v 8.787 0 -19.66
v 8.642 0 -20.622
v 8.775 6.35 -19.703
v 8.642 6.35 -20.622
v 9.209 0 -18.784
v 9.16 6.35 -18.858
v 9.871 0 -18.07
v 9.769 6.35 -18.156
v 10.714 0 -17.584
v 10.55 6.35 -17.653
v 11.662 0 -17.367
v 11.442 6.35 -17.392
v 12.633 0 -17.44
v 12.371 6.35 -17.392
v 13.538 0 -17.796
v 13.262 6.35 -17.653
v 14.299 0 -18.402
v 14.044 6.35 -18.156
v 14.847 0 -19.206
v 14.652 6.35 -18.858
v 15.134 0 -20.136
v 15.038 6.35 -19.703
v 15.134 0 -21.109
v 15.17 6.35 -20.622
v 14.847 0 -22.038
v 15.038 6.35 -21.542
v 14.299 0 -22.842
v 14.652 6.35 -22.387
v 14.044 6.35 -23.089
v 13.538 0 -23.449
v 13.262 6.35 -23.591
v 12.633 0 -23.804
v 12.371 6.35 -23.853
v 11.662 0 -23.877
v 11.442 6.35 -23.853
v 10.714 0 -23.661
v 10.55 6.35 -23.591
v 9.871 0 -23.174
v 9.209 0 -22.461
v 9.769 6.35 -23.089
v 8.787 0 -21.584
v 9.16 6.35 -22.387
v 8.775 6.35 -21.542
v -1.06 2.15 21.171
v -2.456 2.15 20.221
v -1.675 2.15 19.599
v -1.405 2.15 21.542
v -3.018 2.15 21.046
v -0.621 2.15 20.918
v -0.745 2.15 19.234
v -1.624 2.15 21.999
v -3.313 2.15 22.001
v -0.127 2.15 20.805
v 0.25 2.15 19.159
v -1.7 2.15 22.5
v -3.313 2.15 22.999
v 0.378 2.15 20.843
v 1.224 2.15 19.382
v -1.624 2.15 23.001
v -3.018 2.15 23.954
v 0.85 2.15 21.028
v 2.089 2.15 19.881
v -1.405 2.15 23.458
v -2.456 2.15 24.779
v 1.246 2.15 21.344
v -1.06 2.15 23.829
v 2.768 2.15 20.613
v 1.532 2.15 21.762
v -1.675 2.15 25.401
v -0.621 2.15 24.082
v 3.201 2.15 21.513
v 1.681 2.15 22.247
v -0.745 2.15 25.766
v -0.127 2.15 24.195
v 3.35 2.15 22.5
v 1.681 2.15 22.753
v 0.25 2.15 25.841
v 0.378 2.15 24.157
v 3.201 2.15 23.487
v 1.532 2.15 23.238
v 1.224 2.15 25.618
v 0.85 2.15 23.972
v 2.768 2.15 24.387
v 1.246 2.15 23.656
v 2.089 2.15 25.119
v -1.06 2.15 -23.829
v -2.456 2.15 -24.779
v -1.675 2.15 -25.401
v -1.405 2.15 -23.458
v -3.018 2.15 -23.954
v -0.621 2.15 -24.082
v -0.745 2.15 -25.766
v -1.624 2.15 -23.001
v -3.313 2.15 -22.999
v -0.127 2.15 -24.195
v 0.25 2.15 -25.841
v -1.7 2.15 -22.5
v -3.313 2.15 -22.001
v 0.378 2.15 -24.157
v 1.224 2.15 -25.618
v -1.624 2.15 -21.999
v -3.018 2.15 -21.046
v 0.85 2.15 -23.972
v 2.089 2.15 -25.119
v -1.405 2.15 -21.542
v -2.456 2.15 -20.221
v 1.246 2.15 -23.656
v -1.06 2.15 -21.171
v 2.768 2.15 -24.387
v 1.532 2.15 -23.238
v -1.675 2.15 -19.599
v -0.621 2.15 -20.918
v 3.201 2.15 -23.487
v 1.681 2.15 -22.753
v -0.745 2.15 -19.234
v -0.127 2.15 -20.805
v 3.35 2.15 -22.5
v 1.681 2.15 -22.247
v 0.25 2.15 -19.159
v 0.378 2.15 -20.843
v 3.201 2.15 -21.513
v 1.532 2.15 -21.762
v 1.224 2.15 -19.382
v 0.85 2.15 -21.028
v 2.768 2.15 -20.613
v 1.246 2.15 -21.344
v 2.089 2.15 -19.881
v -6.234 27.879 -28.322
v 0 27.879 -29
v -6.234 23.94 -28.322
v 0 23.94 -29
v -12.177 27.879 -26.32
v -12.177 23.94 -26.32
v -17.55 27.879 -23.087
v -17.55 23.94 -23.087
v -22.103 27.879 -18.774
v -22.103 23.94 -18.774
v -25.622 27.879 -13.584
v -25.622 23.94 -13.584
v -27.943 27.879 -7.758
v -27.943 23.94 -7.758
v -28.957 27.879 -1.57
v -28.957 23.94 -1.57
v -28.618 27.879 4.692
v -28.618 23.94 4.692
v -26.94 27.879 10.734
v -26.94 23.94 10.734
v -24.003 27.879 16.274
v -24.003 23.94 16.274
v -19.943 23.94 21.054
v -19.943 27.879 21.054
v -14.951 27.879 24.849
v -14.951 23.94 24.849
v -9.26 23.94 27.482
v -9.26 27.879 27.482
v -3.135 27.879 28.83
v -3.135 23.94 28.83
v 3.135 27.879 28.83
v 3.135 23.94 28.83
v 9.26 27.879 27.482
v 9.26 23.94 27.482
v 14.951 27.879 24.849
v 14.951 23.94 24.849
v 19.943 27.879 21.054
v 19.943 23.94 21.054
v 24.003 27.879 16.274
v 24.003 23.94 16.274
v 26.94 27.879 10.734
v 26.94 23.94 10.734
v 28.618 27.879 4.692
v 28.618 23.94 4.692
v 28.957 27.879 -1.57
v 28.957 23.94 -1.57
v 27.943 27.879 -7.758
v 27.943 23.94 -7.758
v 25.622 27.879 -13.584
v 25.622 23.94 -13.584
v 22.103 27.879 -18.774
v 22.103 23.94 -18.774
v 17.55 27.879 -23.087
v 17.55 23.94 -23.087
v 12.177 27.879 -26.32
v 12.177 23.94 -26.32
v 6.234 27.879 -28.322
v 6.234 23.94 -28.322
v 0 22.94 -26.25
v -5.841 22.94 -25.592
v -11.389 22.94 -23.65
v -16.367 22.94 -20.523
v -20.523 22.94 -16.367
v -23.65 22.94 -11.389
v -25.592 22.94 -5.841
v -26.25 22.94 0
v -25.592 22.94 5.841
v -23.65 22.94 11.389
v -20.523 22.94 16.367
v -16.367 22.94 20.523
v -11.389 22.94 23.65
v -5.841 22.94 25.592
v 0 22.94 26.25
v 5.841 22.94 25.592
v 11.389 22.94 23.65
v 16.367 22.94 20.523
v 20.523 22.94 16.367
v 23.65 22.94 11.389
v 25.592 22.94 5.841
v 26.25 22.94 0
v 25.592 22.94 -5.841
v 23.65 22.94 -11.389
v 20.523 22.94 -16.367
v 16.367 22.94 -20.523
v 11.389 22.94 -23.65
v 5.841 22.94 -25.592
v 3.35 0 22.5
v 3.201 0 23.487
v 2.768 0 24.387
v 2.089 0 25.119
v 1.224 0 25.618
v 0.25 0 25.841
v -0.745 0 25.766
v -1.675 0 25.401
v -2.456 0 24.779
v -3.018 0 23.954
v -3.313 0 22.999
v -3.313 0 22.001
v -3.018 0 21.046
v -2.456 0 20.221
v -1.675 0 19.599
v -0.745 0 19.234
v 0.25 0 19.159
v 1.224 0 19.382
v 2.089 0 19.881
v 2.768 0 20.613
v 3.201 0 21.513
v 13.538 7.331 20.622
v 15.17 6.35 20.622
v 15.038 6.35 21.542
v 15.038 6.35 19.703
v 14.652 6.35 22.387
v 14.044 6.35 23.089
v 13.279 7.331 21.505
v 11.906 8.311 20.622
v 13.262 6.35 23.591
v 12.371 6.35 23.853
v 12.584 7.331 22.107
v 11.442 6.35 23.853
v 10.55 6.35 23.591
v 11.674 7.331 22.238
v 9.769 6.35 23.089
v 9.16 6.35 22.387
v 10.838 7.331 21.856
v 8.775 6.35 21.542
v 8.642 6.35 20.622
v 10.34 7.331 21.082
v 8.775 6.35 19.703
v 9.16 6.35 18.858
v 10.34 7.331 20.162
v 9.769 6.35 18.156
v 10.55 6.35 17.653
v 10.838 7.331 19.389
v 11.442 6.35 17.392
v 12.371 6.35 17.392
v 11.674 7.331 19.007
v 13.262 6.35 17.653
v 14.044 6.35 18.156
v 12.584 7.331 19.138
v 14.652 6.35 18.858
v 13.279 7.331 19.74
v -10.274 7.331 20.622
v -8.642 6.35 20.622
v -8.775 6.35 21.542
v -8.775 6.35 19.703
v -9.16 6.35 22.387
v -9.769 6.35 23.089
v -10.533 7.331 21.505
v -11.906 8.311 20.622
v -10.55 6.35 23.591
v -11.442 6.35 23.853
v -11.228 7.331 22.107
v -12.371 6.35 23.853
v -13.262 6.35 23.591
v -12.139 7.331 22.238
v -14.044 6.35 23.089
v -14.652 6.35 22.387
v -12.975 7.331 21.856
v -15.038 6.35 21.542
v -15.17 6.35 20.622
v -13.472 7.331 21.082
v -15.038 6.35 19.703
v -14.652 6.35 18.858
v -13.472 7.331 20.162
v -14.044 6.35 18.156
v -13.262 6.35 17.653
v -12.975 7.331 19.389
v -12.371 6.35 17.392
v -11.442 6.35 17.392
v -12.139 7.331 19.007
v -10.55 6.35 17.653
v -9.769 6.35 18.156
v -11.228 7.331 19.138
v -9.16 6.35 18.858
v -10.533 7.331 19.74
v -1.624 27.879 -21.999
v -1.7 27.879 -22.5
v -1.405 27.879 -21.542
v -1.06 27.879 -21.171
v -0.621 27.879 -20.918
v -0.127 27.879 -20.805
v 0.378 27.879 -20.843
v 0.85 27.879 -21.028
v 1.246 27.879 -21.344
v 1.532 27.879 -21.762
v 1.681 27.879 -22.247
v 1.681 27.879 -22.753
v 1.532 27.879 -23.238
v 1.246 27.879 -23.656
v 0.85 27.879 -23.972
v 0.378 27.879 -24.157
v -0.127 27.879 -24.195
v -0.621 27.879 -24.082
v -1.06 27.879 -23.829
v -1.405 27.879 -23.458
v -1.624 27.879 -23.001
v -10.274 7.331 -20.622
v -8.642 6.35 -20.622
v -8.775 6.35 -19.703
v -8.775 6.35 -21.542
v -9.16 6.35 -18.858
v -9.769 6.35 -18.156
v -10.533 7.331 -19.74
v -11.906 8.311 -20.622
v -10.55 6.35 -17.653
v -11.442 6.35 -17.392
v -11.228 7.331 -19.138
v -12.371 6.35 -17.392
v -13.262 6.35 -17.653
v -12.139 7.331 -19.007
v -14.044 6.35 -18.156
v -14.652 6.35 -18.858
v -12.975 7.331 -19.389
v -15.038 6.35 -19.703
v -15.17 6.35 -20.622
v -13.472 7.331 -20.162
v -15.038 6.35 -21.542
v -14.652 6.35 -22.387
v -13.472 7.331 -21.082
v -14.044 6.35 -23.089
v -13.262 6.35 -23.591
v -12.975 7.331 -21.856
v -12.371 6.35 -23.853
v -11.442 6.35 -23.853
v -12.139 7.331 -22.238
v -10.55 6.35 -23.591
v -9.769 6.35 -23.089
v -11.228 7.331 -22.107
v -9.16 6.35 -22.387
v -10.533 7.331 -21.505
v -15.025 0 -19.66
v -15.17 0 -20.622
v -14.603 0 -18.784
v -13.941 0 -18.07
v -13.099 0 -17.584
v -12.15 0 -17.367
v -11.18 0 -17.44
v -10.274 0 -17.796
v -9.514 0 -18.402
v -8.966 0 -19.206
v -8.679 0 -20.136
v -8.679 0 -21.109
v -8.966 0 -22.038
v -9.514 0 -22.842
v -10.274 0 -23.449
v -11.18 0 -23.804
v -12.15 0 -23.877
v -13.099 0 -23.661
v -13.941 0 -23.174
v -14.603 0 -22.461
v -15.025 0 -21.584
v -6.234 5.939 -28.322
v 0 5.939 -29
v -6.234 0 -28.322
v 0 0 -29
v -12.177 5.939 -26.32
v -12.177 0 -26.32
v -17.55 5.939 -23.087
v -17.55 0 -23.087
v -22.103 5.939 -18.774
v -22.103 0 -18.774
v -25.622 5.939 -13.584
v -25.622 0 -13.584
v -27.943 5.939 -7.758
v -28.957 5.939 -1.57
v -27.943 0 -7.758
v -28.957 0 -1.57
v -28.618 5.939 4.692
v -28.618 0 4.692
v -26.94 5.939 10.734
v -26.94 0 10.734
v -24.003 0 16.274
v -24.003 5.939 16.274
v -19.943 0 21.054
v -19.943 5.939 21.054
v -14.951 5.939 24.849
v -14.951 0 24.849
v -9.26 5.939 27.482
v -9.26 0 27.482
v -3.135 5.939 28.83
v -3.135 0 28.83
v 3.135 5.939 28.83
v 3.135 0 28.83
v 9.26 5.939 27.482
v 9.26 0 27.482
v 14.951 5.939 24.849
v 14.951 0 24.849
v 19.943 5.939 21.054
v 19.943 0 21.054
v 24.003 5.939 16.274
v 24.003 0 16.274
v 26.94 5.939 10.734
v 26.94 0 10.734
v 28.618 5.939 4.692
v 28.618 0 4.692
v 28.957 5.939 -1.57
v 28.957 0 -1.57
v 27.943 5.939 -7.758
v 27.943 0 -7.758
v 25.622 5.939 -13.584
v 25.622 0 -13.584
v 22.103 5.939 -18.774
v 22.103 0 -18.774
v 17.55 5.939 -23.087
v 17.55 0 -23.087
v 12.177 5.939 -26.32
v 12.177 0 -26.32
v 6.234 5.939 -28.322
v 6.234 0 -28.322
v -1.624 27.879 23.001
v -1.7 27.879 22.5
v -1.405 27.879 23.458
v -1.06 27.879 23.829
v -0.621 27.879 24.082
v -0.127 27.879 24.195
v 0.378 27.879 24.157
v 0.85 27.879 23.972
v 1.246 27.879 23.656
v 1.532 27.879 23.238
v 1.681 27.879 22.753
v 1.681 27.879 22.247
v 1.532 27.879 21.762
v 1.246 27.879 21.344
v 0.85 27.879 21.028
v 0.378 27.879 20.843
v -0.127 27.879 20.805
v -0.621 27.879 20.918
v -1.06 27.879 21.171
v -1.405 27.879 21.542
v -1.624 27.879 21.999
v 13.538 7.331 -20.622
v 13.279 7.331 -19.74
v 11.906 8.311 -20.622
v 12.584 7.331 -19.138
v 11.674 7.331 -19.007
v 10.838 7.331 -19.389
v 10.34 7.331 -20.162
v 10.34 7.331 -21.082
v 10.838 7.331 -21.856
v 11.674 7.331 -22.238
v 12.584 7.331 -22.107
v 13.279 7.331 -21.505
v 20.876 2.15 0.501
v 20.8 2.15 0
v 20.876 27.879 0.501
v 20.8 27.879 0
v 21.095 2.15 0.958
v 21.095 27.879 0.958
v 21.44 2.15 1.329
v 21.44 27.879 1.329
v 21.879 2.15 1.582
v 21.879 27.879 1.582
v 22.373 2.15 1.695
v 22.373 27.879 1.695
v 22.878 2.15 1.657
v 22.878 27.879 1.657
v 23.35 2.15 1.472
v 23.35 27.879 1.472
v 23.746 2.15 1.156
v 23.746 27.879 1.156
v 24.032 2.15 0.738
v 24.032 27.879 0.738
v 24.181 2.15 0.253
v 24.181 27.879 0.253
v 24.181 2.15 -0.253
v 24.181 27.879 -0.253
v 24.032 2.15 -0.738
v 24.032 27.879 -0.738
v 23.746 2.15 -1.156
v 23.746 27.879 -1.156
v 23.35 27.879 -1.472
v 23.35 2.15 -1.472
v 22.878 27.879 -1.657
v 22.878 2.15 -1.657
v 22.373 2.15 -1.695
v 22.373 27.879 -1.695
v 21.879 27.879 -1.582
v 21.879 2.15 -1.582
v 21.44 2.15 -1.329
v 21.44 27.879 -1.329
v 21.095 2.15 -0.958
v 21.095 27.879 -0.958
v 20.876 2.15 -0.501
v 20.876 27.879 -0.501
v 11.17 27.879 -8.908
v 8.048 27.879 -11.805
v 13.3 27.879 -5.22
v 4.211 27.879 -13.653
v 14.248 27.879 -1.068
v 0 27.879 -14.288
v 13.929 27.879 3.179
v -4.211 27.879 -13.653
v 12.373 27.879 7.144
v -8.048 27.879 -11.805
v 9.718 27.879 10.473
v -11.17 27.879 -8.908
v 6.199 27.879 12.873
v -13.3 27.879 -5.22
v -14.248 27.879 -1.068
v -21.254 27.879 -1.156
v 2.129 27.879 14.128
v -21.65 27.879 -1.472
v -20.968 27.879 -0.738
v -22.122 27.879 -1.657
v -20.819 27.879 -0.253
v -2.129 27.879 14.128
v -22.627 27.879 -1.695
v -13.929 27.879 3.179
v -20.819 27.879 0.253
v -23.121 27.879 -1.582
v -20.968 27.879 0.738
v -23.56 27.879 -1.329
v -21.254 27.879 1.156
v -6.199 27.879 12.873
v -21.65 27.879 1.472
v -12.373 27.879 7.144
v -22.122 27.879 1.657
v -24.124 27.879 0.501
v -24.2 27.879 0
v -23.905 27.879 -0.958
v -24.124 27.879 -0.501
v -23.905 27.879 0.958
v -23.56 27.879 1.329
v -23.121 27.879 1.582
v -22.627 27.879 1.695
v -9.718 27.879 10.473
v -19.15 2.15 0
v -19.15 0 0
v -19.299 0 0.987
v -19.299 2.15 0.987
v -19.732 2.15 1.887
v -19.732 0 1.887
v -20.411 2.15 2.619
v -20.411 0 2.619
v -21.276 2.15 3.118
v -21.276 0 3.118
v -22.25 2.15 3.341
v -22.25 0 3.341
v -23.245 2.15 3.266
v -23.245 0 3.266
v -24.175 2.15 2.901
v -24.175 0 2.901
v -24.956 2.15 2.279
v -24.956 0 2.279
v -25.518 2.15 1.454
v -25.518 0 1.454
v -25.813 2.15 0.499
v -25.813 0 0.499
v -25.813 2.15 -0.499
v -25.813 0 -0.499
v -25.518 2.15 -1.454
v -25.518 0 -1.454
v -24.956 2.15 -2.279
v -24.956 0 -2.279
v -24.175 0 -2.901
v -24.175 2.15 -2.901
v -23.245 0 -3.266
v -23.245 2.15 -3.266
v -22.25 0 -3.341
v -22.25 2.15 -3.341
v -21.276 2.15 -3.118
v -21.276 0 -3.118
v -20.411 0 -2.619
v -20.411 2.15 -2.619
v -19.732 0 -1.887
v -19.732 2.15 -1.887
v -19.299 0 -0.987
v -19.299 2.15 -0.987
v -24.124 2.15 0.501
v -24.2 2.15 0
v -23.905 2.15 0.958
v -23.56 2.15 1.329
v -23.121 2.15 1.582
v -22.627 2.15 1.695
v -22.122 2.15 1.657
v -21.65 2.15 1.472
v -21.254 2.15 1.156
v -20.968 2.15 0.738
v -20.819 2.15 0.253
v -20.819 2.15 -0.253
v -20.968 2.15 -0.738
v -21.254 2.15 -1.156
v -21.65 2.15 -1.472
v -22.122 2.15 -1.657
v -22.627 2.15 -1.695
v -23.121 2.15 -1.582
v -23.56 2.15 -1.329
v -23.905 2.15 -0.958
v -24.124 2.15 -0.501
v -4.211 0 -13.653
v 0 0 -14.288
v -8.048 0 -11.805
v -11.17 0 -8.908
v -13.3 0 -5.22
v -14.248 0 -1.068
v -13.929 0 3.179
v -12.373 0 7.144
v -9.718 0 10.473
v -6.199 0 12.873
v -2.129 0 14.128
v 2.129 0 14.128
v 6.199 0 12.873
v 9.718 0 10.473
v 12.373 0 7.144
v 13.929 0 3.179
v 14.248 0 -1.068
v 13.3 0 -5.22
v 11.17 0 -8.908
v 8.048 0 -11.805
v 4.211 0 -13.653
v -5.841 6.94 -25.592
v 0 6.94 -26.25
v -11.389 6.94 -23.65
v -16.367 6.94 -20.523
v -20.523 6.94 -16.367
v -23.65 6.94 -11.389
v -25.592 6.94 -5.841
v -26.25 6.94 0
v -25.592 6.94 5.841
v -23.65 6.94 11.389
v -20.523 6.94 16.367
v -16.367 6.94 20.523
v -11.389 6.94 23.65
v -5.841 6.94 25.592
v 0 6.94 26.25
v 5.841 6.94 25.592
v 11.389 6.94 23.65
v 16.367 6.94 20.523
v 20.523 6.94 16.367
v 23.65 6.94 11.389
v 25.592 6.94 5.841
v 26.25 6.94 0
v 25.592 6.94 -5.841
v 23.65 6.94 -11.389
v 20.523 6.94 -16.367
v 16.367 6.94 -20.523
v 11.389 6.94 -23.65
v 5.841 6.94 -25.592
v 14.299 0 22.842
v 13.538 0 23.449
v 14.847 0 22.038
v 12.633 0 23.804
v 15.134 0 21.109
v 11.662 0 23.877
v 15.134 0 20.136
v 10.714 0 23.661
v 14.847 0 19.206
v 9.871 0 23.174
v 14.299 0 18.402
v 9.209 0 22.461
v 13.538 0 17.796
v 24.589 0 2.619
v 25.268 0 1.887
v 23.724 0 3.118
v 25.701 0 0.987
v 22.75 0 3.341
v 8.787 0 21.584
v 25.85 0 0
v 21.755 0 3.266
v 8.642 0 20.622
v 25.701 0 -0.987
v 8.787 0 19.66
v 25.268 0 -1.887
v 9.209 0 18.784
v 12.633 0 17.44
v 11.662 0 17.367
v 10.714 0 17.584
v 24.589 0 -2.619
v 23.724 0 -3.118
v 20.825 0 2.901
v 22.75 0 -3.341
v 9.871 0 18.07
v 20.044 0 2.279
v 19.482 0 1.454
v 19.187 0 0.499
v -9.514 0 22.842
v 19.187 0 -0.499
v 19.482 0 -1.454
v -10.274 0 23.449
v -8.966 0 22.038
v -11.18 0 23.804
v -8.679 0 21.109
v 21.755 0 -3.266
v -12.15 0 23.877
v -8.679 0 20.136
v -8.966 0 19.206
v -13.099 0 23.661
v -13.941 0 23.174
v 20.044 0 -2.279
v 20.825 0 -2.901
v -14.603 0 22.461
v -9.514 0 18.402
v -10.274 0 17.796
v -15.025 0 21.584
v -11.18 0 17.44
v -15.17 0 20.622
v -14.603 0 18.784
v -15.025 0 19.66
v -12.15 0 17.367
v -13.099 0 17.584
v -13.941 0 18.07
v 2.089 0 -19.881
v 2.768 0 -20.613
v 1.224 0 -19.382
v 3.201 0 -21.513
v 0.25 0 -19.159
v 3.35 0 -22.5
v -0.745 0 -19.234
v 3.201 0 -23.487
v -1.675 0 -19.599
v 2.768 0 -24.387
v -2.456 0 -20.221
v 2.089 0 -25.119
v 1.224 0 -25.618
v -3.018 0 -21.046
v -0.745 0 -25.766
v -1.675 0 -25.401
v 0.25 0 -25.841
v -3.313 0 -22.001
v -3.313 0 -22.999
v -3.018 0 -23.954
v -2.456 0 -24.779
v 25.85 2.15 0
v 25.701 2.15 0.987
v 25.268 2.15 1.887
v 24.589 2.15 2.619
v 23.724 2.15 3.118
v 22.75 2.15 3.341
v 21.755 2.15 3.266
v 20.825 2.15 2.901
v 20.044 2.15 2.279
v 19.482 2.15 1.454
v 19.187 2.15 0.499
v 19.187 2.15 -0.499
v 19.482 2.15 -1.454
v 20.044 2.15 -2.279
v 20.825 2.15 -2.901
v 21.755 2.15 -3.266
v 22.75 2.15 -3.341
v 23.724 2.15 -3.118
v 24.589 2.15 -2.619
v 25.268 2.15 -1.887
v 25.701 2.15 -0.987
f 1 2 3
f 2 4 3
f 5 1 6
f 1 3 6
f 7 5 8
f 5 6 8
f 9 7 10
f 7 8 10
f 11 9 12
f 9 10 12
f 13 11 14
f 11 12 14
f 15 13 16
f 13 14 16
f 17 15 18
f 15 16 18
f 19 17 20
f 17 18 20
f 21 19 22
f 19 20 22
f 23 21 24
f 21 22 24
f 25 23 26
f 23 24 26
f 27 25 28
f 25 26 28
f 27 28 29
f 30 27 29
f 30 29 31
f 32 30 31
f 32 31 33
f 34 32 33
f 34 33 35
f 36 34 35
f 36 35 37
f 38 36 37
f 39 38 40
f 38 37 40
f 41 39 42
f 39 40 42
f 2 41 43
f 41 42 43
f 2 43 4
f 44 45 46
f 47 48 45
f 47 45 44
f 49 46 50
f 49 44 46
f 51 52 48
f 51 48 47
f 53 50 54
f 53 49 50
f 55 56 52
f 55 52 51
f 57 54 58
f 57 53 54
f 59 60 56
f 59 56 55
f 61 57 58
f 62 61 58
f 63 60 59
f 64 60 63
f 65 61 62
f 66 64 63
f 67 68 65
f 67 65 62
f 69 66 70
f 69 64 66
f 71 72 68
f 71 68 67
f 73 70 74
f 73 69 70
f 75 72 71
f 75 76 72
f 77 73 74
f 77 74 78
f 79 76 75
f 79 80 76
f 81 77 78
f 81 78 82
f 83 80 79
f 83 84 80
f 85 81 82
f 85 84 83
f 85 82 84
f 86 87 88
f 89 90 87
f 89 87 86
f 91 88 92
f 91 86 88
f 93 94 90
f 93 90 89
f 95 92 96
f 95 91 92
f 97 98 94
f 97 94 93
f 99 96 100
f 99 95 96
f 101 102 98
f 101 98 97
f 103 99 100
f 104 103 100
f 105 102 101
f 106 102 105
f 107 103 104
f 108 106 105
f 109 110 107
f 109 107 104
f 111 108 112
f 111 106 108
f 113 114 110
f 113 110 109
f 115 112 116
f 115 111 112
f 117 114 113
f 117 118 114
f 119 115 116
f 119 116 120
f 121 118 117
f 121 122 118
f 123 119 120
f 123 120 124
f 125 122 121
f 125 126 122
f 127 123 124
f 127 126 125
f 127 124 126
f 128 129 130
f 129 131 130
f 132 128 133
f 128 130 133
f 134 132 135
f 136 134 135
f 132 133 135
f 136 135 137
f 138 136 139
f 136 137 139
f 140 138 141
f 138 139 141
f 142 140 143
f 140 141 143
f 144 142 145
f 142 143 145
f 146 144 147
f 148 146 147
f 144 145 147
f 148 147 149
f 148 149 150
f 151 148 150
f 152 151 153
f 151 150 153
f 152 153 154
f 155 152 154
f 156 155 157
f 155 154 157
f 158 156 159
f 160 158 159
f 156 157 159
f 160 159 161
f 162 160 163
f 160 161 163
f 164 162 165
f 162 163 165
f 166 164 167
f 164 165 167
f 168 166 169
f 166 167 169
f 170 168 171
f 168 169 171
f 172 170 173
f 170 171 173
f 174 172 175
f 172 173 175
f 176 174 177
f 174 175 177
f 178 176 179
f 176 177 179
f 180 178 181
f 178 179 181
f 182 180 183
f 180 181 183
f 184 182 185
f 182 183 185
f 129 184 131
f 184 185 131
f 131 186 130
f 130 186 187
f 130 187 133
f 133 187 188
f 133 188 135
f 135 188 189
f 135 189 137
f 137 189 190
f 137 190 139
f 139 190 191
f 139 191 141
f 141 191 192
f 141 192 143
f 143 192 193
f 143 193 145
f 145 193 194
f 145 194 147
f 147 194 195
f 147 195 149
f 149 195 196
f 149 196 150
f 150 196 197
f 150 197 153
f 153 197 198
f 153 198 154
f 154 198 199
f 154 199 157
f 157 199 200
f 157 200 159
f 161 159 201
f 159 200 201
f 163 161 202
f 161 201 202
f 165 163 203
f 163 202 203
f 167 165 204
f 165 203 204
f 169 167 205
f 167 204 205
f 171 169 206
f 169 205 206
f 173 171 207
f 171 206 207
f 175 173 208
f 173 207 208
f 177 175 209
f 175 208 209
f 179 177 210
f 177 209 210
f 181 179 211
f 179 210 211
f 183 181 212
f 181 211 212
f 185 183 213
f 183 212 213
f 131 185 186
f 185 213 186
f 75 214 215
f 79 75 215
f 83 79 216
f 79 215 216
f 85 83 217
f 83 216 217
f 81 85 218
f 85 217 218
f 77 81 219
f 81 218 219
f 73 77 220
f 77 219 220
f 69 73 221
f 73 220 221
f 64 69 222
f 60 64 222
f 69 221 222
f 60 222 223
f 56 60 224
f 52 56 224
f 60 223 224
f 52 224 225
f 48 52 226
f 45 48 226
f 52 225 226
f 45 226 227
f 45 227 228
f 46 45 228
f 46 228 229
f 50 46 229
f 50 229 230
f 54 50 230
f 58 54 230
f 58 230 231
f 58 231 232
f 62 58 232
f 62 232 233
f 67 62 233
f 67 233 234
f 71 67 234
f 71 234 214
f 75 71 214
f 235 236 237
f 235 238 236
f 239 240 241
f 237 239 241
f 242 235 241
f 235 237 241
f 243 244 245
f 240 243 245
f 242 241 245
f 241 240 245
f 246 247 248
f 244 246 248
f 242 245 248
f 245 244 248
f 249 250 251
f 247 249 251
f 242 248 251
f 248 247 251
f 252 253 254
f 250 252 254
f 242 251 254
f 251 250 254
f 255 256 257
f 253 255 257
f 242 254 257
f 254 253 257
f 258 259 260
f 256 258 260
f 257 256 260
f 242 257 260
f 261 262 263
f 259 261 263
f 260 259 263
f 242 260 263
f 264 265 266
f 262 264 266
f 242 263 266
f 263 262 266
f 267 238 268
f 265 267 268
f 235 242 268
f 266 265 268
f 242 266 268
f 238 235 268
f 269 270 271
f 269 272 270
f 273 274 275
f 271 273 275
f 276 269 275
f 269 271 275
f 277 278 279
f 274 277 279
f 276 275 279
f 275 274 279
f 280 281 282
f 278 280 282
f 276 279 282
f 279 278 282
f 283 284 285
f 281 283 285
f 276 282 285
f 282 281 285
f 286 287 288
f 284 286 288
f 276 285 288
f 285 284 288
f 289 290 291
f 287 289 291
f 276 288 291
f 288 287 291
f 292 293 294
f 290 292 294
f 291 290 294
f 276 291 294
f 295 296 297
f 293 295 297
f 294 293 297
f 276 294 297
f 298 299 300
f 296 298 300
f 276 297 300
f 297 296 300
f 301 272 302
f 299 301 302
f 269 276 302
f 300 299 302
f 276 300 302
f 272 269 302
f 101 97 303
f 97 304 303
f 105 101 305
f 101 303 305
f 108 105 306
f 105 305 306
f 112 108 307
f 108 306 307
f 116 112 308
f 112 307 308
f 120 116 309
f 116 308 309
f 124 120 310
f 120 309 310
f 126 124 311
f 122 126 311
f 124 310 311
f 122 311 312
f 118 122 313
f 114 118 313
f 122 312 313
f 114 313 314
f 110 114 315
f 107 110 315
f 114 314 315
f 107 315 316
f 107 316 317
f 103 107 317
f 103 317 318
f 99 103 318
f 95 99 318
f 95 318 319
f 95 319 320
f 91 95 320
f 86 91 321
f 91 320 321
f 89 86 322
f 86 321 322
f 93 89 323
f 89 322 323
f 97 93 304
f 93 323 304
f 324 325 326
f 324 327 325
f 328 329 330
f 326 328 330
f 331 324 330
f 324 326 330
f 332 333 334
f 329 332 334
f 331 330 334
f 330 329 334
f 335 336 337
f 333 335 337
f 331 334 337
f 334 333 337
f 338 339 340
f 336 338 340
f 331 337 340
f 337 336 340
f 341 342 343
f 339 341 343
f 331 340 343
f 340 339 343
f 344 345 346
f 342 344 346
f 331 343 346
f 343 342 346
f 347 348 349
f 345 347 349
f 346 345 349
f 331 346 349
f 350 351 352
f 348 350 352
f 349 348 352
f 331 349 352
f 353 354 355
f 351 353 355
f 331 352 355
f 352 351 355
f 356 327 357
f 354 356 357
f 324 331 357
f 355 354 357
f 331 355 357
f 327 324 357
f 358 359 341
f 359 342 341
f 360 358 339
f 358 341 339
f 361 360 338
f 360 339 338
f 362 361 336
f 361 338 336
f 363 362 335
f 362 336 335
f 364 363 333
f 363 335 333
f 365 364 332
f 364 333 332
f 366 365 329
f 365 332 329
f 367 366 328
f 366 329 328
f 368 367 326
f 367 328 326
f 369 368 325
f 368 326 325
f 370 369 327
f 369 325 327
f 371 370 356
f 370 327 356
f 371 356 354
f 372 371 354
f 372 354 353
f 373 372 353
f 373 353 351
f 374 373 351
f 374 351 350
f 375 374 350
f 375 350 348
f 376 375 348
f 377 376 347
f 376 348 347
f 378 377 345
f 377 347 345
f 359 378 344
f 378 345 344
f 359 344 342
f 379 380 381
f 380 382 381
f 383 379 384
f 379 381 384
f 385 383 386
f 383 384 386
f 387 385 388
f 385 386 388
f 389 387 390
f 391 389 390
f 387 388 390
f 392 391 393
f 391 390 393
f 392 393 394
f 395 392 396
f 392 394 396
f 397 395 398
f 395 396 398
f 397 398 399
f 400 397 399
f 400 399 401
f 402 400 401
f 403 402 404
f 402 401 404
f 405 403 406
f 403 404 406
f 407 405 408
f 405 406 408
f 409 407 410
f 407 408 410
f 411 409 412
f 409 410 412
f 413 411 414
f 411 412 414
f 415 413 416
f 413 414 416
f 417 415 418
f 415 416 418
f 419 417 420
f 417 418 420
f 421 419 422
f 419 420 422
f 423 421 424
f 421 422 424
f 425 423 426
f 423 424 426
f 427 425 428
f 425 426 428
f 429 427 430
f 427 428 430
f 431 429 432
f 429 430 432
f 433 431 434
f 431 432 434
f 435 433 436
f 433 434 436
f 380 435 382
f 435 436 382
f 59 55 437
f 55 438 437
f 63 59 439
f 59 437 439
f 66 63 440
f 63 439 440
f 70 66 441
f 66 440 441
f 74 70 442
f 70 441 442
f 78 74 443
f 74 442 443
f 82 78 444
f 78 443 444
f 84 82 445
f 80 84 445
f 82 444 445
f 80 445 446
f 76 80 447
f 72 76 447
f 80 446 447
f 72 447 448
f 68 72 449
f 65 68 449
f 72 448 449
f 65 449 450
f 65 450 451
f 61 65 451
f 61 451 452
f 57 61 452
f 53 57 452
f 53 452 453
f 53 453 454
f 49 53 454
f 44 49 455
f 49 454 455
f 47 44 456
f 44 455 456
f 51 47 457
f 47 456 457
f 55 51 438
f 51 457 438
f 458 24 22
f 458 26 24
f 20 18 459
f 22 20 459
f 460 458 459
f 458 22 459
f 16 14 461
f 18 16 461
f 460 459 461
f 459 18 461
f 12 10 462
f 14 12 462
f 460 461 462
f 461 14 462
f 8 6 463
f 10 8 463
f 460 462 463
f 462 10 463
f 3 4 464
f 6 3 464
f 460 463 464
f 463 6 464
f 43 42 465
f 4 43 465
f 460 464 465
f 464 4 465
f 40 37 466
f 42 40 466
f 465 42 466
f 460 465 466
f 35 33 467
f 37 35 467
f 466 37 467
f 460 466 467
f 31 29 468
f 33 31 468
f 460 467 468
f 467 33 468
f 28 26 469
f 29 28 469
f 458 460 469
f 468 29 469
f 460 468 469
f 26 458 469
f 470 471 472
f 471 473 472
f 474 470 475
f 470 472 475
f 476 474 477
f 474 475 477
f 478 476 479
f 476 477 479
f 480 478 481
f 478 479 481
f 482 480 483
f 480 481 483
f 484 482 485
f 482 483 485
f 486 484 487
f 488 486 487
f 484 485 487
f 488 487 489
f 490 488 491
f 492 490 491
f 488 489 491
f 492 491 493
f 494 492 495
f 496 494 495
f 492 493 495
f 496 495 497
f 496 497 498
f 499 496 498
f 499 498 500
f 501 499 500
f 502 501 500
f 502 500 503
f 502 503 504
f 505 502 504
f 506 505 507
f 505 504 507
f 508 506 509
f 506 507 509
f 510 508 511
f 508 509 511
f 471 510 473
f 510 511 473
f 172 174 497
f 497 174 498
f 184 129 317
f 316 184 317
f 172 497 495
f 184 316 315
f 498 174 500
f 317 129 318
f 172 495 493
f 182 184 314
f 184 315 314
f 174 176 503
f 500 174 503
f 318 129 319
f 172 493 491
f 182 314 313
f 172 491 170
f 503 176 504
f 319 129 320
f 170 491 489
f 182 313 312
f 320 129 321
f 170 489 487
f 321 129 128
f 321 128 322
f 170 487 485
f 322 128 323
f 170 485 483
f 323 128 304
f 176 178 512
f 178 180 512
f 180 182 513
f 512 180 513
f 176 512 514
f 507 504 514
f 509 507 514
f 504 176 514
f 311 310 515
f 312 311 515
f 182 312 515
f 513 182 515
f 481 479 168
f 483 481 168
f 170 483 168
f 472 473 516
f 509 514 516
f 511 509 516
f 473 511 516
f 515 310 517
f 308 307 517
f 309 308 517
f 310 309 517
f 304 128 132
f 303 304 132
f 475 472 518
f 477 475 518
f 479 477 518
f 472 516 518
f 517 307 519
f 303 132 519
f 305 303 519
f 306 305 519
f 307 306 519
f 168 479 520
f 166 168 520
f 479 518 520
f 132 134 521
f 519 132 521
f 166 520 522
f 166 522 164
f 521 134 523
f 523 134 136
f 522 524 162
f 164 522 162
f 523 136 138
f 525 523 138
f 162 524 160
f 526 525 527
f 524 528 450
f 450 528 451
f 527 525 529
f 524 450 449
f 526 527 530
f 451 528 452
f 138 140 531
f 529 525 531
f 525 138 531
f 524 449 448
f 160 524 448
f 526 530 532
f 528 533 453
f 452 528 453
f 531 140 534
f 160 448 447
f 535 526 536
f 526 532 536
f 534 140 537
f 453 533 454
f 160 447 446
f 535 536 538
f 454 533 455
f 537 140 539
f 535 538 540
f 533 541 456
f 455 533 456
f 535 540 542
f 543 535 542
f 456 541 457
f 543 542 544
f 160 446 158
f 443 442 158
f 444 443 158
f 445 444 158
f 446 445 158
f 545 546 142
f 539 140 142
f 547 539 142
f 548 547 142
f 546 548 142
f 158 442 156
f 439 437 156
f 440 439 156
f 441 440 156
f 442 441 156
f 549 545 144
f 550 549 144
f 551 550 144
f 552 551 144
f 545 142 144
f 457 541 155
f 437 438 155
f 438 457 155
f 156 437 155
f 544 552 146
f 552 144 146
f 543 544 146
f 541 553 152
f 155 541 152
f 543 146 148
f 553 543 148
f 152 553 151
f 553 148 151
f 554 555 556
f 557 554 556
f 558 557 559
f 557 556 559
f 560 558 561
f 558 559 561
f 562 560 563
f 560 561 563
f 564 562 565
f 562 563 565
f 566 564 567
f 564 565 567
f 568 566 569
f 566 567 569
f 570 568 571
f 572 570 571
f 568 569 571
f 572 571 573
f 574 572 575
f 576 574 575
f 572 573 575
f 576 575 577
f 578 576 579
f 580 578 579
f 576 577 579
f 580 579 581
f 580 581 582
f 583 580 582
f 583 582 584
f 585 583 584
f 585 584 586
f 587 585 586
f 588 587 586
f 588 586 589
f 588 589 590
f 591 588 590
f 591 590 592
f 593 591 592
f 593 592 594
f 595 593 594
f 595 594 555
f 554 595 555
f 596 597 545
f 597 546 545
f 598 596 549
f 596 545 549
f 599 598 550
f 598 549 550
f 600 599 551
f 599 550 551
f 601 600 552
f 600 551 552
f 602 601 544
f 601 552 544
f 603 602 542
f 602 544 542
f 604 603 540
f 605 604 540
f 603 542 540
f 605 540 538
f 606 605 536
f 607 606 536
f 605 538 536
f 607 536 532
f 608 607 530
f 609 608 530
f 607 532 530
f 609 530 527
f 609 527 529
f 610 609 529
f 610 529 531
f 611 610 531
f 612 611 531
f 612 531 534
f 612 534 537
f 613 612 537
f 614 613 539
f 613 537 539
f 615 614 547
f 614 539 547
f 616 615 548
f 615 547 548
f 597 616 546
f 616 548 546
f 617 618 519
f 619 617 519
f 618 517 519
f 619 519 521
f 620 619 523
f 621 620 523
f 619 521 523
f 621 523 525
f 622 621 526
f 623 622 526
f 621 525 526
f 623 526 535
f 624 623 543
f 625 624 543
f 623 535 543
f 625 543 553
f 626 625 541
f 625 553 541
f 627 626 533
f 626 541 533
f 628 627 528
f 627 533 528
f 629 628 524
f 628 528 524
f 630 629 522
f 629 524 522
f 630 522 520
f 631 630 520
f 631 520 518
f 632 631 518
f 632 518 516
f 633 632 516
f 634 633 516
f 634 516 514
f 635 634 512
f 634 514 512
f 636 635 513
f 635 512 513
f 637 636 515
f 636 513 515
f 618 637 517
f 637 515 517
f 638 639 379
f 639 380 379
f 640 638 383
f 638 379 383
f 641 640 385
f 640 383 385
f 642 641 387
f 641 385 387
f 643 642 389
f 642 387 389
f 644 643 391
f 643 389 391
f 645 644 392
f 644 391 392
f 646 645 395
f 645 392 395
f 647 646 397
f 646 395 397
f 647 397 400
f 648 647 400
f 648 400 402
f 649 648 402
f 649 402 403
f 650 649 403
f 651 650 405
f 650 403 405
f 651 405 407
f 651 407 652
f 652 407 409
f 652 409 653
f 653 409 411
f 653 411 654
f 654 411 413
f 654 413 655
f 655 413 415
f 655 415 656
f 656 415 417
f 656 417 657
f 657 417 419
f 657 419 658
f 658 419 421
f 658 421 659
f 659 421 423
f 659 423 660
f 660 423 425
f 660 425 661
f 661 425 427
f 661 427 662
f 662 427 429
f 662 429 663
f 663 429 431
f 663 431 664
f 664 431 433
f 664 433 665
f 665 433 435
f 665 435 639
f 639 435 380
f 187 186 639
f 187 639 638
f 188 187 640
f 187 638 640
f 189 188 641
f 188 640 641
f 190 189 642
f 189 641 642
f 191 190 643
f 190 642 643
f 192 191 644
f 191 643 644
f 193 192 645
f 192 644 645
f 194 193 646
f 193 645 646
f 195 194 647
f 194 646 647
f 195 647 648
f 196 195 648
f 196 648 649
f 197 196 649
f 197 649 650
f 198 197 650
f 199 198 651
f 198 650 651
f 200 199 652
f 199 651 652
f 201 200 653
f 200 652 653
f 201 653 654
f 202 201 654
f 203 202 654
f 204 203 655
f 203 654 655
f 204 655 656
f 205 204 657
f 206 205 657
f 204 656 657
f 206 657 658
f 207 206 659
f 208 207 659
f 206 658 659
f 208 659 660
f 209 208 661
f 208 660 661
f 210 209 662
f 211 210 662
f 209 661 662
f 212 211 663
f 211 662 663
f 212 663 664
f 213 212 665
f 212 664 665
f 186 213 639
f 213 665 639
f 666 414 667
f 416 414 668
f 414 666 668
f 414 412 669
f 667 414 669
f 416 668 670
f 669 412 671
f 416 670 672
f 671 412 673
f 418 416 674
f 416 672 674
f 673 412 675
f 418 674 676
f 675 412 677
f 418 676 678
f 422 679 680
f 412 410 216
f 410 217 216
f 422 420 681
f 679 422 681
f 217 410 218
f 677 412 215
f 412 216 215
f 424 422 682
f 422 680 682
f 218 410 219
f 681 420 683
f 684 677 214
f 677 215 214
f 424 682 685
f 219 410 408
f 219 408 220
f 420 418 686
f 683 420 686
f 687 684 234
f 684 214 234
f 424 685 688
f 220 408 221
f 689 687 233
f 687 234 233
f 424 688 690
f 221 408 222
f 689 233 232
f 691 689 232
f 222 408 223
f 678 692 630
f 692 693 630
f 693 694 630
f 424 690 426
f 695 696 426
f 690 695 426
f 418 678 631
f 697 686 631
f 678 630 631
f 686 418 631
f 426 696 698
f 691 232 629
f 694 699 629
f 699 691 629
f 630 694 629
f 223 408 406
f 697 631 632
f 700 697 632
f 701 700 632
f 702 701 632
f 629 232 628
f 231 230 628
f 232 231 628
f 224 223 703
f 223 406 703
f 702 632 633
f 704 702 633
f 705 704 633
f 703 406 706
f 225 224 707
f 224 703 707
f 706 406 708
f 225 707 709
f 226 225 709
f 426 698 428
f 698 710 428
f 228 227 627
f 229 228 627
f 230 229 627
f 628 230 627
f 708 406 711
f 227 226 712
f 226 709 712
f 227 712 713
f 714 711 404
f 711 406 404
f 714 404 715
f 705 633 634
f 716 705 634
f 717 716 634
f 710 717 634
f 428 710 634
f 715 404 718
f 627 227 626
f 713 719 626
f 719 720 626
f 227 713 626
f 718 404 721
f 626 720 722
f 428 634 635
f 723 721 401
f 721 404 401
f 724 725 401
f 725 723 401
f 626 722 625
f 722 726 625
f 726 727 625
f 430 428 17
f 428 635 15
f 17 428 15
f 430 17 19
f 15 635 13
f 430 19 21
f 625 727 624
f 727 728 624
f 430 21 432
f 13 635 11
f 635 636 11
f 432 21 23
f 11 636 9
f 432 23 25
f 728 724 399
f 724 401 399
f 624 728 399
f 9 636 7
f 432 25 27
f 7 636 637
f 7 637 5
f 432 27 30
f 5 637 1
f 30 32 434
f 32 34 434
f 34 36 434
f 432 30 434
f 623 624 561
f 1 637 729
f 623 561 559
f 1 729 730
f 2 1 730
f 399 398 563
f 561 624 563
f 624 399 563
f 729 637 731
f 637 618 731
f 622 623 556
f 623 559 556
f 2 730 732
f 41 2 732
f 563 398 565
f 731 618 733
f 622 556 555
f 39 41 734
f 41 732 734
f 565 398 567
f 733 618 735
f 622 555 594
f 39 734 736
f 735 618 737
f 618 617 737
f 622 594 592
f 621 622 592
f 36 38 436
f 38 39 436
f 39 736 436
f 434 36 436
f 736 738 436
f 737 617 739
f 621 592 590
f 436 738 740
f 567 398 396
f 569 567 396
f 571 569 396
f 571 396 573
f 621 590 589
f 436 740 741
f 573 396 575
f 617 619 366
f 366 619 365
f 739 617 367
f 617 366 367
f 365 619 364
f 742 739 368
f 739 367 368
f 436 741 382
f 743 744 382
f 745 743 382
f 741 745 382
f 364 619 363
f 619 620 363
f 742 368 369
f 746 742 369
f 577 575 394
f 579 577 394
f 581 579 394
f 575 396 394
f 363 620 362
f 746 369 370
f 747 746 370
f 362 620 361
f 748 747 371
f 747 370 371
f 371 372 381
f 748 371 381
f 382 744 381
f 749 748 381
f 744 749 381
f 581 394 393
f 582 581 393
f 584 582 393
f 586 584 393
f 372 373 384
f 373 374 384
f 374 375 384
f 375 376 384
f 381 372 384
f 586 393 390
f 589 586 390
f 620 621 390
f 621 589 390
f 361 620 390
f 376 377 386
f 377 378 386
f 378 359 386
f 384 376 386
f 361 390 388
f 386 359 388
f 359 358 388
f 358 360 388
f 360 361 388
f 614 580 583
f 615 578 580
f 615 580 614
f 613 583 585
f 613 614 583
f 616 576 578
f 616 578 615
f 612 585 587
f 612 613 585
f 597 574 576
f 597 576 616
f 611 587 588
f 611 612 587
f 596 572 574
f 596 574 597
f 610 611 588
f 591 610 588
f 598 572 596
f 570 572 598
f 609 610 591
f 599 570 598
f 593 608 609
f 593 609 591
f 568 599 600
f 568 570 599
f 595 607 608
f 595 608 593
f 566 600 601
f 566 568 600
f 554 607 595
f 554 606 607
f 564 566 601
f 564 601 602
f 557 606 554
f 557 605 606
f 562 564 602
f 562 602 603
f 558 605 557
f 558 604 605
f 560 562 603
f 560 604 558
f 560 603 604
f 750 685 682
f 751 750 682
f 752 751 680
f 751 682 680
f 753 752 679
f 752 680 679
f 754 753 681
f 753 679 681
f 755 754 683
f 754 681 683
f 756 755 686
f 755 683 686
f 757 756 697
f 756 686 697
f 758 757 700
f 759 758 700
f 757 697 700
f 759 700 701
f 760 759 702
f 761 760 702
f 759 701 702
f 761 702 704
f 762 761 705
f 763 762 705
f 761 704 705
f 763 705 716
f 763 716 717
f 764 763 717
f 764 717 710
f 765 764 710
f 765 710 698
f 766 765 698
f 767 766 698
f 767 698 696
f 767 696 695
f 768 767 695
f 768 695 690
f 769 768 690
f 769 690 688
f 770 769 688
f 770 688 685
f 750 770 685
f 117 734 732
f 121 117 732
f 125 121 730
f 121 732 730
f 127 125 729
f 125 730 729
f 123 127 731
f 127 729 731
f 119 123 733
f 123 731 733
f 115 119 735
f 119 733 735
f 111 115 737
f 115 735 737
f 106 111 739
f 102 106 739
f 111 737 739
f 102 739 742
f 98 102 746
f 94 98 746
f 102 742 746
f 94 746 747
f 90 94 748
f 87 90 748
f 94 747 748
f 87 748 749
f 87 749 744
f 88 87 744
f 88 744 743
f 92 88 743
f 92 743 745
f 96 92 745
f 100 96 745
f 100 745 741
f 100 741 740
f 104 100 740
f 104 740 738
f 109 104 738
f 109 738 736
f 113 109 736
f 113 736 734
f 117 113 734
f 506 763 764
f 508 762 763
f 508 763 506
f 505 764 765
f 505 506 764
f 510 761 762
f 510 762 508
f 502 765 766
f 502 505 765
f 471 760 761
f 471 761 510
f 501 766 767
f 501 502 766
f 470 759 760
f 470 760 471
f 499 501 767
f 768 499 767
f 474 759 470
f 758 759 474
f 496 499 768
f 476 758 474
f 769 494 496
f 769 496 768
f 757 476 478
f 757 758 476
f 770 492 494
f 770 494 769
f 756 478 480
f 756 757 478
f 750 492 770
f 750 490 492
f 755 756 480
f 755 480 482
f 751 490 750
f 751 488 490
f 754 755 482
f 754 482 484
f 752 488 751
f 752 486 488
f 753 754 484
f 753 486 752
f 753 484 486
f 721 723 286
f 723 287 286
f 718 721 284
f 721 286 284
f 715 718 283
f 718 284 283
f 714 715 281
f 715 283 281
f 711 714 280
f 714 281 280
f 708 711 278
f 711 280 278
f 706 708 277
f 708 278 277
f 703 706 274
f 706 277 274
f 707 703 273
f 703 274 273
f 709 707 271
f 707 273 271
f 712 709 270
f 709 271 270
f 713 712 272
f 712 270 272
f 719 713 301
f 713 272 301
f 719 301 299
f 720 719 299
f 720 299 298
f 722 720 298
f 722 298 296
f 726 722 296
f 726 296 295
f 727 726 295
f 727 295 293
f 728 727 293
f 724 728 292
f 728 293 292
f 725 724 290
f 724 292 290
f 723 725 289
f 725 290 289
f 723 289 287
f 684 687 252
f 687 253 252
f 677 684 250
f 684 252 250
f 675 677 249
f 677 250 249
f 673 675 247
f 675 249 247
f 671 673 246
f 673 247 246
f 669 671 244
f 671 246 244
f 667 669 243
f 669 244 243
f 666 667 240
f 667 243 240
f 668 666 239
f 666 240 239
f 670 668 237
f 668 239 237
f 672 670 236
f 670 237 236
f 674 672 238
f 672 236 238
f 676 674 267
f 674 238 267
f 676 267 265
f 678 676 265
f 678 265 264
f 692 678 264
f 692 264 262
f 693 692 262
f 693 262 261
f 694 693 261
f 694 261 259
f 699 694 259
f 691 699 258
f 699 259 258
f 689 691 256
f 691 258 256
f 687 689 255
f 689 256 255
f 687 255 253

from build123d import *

# Parameters (mm, degrees)
CBORE_FOR_M3_SBHCS1_D           = 3.4
CBORE_FOR_M3_SBHCS1_CBORE_D     = 6.7
CBORE_FOR_M3_SBHCS1_CBORE_DEPTH = 2.15
F_0_257_DIAMETER_HOLE1_D        = 6.5278
F_0_257_DIAMETER_HOLE1_DEPTH    = 6.35
F_0_257_DIAMETER_HOLE1_TIP      = 1.961148974


with BuildPart() as part:
    # Sketch1 → Revolve1 (revolve)
    with BuildSketch(Plane.XY, mode=Mode.PRIVATE) as revolve1_sk:
        Polygon((14.2875, 27.8791), (29, 27.8791), (29, 23.940468144), (26.25, 22.93955), (26.25, 6.93955), (29, 5.938631856), (29, 0), (14.2875, 0), align=None)
    revolve(revolve1_sk.sketch.rotate(Axis((0, 0, 0), (0, 1, 0)), 90), axis=Axis((0, 0, 0), (0, 1, 0)))

    # CBORE for M3 SBHCS1 (through all)
    with Locations(Plane.XZ):
        with Locations((0, 22.5), (0, -22.5), (22.5, 0), (-22.5, 0)):
            CounterBoreHole(CBORE_FOR_M3_SBHCS1_D / 2, CBORE_FOR_M3_SBHCS1_CBORE_D / 2, CBORE_FOR_M3_SBHCS1_CBORE_DEPTH)

    # F (0.257) Diameter Hole1
    with Locations(Plane.XZ):
        with Locations((-11.90625, 20.622229928), (-11.90625, -20.622229928), (11.90625, -20.622229928), (11.90625, 20.622229928)):
            Hole(F_0_257_DIAMETER_HOLE1_D / 2, depth=F_0_257_DIAMETER_HOLE1_DEPTH)
            with Locations((0, 0, -(F_0_257_DIAMETER_HOLE1_DEPTH + F_0_257_DIAMETER_HOLE1_TIP / 2))):  # 118° drill point
                Cone(0, F_0_257_DIAMETER_HOLE1_D / 2, F_0_257_DIAMETER_HOLE1_TIP, mode=Mode.SUBTRACT)


solid = part.part
